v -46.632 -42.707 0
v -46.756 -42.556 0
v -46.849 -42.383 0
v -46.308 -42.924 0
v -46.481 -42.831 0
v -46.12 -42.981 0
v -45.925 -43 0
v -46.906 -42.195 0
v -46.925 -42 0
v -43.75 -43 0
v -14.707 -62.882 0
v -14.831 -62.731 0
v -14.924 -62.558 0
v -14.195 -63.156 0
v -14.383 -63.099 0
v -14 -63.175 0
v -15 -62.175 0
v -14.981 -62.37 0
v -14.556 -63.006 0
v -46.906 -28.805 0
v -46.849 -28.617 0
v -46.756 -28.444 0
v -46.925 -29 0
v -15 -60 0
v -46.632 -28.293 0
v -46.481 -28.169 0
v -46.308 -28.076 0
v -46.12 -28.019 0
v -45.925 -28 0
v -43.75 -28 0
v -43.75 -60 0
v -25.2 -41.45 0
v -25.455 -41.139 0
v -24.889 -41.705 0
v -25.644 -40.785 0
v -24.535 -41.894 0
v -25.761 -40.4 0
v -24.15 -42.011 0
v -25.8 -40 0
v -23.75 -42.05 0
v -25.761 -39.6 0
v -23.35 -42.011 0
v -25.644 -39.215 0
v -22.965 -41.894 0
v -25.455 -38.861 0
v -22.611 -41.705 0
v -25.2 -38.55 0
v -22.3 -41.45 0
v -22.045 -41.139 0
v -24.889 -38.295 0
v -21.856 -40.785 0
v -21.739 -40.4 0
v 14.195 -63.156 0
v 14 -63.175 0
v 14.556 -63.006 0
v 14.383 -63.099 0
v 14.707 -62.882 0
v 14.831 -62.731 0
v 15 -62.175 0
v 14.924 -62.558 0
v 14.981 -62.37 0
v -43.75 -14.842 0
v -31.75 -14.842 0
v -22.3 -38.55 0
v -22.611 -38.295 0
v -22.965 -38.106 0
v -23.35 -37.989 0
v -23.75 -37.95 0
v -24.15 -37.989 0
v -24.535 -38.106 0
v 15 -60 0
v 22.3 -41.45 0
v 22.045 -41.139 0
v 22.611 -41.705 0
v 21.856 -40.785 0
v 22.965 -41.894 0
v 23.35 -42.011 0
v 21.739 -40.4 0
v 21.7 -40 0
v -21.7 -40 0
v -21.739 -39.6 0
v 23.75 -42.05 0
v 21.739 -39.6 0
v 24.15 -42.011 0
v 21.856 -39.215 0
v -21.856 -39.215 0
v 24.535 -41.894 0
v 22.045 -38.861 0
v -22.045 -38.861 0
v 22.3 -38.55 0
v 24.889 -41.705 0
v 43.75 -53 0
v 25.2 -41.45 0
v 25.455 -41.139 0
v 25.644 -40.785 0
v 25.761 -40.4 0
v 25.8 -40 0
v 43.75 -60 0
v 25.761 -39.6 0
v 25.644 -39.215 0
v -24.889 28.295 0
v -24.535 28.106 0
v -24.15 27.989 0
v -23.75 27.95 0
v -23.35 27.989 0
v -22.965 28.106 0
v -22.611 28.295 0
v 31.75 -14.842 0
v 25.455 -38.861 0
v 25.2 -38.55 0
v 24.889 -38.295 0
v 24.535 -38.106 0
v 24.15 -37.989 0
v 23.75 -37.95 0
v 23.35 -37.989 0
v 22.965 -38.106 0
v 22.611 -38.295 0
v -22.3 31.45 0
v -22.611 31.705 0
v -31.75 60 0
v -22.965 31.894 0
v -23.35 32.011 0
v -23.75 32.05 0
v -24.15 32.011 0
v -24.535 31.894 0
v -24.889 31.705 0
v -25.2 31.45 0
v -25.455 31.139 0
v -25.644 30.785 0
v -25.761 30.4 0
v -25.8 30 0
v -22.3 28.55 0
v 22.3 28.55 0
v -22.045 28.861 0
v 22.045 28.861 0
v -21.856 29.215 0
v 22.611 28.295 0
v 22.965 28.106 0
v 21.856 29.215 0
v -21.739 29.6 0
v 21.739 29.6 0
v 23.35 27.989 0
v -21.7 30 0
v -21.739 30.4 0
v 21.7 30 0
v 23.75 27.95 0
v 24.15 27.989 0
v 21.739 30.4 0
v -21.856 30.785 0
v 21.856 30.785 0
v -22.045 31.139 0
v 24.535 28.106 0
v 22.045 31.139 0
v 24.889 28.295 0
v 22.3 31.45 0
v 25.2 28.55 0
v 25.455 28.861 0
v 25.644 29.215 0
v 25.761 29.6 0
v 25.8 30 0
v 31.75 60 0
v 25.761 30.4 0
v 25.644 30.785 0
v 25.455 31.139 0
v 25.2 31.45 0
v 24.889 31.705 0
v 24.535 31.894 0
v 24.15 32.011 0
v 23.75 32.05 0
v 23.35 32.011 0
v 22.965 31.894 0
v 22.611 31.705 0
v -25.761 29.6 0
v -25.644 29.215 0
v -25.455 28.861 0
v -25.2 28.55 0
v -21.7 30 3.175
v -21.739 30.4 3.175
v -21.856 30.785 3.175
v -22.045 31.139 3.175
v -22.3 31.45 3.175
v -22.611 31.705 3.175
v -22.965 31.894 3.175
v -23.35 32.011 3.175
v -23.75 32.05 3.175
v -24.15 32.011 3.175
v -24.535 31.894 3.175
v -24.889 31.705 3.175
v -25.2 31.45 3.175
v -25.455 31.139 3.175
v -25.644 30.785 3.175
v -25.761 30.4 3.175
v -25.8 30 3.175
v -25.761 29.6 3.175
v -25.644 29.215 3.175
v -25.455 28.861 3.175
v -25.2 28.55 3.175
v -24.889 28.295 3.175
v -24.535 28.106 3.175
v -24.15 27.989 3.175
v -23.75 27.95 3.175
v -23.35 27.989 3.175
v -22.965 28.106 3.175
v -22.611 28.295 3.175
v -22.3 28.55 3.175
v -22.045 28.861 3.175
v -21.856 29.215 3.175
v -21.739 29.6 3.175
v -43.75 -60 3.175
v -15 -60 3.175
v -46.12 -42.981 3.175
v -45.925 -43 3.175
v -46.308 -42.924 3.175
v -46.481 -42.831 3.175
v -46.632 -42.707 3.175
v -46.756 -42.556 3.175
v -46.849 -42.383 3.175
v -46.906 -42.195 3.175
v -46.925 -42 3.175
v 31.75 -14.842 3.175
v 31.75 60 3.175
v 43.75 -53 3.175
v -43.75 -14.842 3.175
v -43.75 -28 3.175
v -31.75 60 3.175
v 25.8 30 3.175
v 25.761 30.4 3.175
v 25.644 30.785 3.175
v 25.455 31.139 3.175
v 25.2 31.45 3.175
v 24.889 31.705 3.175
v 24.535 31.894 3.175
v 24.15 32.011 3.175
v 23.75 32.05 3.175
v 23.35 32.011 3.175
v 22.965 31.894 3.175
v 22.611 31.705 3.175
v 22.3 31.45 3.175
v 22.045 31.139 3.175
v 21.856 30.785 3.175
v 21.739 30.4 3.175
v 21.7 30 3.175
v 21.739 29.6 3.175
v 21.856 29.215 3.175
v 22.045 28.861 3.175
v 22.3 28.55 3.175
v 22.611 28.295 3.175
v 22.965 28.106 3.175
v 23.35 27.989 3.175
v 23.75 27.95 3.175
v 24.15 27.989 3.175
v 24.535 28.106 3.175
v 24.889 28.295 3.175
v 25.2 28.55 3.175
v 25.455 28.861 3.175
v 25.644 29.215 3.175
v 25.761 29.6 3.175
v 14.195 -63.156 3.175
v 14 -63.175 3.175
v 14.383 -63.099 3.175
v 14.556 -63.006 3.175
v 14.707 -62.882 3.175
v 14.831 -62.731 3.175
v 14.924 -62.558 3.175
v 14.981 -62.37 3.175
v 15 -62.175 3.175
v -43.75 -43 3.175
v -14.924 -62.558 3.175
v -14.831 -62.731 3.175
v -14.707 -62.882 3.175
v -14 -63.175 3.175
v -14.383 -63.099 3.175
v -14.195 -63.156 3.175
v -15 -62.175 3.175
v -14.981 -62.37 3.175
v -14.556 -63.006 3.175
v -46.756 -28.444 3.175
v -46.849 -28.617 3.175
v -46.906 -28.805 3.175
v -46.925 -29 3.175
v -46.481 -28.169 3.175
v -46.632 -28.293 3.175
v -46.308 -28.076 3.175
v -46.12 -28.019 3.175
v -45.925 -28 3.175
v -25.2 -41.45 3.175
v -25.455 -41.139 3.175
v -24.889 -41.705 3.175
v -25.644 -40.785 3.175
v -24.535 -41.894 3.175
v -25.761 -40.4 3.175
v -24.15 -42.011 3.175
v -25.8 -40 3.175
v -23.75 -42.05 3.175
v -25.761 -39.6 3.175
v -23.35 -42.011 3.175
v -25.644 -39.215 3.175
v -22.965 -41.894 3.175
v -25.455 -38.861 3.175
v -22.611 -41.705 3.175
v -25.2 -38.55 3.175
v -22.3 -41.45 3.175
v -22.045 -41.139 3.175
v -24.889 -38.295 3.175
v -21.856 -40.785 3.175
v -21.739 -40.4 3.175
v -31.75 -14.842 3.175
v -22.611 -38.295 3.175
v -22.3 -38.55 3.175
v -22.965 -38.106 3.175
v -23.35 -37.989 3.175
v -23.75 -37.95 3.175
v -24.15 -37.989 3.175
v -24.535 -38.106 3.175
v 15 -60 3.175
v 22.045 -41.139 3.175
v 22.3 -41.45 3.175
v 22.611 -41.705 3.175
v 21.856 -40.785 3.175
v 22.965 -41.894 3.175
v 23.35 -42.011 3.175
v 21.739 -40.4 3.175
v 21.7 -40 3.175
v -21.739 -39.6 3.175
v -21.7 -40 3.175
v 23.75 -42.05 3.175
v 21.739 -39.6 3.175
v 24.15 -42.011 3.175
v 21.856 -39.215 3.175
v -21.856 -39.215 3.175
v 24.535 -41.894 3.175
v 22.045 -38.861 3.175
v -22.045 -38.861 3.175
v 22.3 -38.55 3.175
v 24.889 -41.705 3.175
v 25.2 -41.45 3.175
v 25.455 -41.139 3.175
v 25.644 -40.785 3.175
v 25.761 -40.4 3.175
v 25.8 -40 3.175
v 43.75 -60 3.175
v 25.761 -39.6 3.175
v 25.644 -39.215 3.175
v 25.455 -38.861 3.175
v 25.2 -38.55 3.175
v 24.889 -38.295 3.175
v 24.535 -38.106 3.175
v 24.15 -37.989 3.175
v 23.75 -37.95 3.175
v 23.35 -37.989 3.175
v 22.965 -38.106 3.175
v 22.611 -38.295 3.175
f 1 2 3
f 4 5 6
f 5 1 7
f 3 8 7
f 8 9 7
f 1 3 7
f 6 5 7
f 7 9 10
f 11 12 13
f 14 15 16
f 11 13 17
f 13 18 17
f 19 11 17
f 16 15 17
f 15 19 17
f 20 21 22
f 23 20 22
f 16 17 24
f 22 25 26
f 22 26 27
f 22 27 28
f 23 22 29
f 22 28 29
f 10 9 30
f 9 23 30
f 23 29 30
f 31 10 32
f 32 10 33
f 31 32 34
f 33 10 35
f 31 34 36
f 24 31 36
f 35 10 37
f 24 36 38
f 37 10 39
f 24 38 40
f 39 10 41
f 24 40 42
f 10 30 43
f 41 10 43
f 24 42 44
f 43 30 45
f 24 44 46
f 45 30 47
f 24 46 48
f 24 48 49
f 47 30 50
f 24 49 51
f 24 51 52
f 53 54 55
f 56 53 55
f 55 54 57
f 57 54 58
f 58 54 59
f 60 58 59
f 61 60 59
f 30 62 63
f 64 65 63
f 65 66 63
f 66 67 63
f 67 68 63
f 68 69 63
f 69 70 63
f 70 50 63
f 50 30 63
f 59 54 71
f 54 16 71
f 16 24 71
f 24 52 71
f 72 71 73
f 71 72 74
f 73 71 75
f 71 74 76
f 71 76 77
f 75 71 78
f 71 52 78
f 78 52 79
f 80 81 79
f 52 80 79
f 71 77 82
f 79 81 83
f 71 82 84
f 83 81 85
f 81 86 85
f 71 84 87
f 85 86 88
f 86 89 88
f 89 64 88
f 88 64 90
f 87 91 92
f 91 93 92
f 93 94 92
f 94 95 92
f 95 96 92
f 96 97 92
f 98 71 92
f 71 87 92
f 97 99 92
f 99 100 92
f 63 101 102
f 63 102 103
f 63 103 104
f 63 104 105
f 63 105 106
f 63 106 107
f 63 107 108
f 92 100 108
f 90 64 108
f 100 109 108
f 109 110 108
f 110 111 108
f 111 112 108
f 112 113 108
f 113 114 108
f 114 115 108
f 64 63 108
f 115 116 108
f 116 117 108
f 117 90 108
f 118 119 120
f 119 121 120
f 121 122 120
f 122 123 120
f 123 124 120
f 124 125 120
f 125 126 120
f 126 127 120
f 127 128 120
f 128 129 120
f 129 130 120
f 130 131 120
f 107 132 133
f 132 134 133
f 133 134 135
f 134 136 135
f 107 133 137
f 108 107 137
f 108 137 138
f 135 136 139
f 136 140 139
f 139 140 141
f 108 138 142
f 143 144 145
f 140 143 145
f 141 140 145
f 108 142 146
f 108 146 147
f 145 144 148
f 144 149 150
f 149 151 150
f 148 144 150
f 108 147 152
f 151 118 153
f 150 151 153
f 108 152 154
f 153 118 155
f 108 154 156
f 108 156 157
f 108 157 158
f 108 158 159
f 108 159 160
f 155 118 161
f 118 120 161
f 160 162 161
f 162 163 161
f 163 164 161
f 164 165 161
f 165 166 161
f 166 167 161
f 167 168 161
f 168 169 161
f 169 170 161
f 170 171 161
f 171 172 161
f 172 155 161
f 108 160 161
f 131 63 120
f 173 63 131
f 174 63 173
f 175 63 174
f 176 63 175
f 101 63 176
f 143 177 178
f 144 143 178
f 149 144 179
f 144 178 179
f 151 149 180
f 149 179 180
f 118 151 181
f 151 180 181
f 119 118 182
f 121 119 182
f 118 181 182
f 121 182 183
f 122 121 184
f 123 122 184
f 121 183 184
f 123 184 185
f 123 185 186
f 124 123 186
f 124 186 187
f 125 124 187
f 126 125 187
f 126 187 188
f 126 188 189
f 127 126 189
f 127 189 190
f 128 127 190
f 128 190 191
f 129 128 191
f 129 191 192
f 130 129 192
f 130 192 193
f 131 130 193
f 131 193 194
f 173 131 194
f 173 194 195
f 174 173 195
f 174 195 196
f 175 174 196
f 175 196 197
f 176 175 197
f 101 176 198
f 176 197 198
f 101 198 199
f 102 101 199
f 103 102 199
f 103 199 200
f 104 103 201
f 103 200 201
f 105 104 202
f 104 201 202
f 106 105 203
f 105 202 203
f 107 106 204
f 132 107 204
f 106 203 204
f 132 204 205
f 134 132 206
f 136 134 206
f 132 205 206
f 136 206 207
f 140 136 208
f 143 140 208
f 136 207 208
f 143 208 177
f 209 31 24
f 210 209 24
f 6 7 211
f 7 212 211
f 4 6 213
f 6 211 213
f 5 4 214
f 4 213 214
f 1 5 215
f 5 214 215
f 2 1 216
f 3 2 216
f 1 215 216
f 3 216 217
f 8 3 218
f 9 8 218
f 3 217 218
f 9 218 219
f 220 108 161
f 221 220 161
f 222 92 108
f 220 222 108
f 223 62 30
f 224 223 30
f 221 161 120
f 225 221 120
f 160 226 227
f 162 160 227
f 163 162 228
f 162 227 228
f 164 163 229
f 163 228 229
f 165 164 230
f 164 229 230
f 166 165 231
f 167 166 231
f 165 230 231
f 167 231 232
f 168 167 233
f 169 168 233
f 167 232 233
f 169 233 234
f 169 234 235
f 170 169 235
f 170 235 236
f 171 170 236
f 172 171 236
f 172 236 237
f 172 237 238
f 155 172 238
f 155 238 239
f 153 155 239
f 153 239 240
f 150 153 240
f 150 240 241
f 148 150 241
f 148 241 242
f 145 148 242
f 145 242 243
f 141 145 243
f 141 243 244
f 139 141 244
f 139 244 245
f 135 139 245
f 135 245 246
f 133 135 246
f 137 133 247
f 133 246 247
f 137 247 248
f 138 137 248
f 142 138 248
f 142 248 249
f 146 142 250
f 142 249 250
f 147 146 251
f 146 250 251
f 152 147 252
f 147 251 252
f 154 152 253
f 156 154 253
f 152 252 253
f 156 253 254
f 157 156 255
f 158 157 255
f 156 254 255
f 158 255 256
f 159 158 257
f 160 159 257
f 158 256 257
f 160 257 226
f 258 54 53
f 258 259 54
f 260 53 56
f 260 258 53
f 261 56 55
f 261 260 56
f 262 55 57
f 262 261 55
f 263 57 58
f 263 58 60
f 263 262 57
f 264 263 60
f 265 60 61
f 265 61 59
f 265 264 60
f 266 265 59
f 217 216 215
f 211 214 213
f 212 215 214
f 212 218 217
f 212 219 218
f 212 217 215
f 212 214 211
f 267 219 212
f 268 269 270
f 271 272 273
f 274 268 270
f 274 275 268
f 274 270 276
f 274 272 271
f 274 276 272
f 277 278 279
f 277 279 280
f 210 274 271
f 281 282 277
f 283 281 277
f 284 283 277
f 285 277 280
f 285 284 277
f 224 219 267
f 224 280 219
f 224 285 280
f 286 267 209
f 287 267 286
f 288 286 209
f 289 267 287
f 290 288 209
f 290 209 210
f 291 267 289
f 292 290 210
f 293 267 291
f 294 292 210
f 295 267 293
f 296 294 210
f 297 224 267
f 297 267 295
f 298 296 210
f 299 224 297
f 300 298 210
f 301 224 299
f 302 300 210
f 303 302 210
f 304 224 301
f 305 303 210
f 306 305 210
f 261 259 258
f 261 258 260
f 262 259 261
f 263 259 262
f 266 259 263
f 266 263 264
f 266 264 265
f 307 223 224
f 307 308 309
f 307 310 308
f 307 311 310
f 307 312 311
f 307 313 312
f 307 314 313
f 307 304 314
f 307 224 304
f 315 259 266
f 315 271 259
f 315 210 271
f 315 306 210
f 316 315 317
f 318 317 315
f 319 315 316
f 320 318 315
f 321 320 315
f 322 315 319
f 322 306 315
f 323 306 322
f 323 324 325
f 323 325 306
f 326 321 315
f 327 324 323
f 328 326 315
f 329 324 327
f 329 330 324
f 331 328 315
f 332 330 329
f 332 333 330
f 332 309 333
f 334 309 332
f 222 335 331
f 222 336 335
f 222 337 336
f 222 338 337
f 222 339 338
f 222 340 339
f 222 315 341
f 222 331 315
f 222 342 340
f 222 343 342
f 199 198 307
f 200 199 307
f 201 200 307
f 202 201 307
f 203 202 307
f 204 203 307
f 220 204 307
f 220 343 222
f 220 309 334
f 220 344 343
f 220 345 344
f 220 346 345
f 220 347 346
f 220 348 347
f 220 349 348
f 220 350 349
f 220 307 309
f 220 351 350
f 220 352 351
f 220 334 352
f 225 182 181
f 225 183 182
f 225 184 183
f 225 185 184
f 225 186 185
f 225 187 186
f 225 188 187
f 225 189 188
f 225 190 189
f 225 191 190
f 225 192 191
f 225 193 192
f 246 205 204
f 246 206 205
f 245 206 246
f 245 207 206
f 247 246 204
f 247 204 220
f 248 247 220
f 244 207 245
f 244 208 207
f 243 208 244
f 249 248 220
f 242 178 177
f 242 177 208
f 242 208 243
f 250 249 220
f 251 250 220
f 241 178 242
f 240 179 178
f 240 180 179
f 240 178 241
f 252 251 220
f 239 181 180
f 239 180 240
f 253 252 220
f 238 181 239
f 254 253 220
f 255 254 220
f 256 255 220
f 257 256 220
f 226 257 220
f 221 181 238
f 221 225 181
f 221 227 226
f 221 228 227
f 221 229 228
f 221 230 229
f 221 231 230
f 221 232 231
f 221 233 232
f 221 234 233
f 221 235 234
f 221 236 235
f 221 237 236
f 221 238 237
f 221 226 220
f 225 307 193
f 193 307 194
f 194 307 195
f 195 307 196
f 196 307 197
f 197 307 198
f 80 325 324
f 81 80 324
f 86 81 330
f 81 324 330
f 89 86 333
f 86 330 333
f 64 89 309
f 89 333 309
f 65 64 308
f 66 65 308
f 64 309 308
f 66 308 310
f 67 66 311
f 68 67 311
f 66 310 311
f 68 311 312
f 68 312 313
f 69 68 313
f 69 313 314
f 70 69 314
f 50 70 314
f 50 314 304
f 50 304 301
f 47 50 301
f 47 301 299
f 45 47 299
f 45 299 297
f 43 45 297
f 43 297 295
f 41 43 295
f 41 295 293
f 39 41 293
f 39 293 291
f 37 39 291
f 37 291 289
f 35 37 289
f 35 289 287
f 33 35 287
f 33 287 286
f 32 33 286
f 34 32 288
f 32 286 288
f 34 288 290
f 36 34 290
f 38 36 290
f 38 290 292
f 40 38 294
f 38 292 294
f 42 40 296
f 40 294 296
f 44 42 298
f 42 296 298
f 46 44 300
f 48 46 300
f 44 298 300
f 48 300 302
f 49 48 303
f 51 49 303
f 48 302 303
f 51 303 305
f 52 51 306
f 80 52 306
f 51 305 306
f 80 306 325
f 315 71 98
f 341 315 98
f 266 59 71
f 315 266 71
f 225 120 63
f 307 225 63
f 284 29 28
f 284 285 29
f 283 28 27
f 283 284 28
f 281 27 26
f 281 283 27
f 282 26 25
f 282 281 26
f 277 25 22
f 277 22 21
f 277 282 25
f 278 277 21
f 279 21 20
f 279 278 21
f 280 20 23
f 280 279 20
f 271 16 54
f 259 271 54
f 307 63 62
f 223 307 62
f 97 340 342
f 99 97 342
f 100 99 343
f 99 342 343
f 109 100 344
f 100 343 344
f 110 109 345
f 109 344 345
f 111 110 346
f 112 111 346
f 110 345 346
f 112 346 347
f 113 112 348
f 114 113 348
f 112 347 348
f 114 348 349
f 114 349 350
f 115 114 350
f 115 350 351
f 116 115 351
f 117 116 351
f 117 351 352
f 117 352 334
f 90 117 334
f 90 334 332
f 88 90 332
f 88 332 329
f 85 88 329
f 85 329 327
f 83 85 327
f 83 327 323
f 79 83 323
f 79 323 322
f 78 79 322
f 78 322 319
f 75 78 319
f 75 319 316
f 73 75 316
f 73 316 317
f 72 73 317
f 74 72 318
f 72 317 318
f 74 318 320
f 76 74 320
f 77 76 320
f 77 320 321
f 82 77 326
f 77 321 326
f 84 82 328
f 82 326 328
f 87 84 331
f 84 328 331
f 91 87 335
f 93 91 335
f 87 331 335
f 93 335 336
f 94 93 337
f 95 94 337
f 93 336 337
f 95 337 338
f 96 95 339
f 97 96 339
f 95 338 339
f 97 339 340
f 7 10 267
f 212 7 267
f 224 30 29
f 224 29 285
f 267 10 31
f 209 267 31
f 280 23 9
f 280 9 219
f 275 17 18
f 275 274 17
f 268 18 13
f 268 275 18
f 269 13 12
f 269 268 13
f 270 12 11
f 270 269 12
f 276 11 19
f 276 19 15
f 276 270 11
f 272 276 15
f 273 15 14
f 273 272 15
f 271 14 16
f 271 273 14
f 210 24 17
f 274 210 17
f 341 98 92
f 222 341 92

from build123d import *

# Parameters (mm, degrees)
BOSS_EXTRUDE1_DEPTH = 3.175
SKETCH2_R           = 2.05
CUT_EXTRUDE1_DEPTH  = 4.175
SKETCH3_W           = 3.175
SKETCH3_H           = 15
BOSS_EXTRUDE2_DEPTH = 3.175
FILLET1_R           = 1


with BuildPart() as part:
    # Sketch1 → Boss-Extrude1 (new body)
    with BuildSketch(Plane.XY):
        Polygon((-31.75, -60), (-15, -60), (-15, -63.175), (15, -63.175), (15, -60), (31.75, -60), (43.75, -60), (43.75, -53), (31.75, -14.842431943), (31.75, 60), (-31.75, 60), (-31.75, -14.842431943), (-43.75, -14.842431943), (-43.75, -53), (-43.75, -60), align=None)
    extrude(amount=BOSS_EXTRUDE1_DEPTH)

    # Sketch2 → Cut-Extrude1 (cut, through all)
    with BuildSketch(Plane.XY.offset(3.175)):
        with Locations((23.75, 30)):
            Circle(SKETCH2_R)
        with Locations((23.75, -40)):
            Circle(SKETCH2_R)
        with Locations((-23.75, -40)):
            Circle(SKETCH2_R)
        with Locations((-23.75, 30)):
            Circle(SKETCH2_R)
    extrude(amount=-CUT_EXTRUDE1_DEPTH, mode=Mode.SUBTRACT)

    # Sketch3 → Boss-Extrude2 (add)
    with BuildSketch(Plane.ZY.offset(43.75)):
        with Locations((1.5875, -35.5)):
            Rectangle(SKETCH3_W, SKETCH3_H)
    extrude(amount=BOSS_EXTRUDE2_DEPTH)

    # Fillet1
    fillet1_edges = [part.edges().sort_by_distance(p)[0] for p in [
        (15, -63.175, 1.5875),
        (-15, -63.175, 1.5875),
        (-46.925, -43, 1.5875),
        (-46.925, -28, 1.5875),
    ]]
    fillet(fillet1_edges, radius=FILLET1_R)


solid = part.part
